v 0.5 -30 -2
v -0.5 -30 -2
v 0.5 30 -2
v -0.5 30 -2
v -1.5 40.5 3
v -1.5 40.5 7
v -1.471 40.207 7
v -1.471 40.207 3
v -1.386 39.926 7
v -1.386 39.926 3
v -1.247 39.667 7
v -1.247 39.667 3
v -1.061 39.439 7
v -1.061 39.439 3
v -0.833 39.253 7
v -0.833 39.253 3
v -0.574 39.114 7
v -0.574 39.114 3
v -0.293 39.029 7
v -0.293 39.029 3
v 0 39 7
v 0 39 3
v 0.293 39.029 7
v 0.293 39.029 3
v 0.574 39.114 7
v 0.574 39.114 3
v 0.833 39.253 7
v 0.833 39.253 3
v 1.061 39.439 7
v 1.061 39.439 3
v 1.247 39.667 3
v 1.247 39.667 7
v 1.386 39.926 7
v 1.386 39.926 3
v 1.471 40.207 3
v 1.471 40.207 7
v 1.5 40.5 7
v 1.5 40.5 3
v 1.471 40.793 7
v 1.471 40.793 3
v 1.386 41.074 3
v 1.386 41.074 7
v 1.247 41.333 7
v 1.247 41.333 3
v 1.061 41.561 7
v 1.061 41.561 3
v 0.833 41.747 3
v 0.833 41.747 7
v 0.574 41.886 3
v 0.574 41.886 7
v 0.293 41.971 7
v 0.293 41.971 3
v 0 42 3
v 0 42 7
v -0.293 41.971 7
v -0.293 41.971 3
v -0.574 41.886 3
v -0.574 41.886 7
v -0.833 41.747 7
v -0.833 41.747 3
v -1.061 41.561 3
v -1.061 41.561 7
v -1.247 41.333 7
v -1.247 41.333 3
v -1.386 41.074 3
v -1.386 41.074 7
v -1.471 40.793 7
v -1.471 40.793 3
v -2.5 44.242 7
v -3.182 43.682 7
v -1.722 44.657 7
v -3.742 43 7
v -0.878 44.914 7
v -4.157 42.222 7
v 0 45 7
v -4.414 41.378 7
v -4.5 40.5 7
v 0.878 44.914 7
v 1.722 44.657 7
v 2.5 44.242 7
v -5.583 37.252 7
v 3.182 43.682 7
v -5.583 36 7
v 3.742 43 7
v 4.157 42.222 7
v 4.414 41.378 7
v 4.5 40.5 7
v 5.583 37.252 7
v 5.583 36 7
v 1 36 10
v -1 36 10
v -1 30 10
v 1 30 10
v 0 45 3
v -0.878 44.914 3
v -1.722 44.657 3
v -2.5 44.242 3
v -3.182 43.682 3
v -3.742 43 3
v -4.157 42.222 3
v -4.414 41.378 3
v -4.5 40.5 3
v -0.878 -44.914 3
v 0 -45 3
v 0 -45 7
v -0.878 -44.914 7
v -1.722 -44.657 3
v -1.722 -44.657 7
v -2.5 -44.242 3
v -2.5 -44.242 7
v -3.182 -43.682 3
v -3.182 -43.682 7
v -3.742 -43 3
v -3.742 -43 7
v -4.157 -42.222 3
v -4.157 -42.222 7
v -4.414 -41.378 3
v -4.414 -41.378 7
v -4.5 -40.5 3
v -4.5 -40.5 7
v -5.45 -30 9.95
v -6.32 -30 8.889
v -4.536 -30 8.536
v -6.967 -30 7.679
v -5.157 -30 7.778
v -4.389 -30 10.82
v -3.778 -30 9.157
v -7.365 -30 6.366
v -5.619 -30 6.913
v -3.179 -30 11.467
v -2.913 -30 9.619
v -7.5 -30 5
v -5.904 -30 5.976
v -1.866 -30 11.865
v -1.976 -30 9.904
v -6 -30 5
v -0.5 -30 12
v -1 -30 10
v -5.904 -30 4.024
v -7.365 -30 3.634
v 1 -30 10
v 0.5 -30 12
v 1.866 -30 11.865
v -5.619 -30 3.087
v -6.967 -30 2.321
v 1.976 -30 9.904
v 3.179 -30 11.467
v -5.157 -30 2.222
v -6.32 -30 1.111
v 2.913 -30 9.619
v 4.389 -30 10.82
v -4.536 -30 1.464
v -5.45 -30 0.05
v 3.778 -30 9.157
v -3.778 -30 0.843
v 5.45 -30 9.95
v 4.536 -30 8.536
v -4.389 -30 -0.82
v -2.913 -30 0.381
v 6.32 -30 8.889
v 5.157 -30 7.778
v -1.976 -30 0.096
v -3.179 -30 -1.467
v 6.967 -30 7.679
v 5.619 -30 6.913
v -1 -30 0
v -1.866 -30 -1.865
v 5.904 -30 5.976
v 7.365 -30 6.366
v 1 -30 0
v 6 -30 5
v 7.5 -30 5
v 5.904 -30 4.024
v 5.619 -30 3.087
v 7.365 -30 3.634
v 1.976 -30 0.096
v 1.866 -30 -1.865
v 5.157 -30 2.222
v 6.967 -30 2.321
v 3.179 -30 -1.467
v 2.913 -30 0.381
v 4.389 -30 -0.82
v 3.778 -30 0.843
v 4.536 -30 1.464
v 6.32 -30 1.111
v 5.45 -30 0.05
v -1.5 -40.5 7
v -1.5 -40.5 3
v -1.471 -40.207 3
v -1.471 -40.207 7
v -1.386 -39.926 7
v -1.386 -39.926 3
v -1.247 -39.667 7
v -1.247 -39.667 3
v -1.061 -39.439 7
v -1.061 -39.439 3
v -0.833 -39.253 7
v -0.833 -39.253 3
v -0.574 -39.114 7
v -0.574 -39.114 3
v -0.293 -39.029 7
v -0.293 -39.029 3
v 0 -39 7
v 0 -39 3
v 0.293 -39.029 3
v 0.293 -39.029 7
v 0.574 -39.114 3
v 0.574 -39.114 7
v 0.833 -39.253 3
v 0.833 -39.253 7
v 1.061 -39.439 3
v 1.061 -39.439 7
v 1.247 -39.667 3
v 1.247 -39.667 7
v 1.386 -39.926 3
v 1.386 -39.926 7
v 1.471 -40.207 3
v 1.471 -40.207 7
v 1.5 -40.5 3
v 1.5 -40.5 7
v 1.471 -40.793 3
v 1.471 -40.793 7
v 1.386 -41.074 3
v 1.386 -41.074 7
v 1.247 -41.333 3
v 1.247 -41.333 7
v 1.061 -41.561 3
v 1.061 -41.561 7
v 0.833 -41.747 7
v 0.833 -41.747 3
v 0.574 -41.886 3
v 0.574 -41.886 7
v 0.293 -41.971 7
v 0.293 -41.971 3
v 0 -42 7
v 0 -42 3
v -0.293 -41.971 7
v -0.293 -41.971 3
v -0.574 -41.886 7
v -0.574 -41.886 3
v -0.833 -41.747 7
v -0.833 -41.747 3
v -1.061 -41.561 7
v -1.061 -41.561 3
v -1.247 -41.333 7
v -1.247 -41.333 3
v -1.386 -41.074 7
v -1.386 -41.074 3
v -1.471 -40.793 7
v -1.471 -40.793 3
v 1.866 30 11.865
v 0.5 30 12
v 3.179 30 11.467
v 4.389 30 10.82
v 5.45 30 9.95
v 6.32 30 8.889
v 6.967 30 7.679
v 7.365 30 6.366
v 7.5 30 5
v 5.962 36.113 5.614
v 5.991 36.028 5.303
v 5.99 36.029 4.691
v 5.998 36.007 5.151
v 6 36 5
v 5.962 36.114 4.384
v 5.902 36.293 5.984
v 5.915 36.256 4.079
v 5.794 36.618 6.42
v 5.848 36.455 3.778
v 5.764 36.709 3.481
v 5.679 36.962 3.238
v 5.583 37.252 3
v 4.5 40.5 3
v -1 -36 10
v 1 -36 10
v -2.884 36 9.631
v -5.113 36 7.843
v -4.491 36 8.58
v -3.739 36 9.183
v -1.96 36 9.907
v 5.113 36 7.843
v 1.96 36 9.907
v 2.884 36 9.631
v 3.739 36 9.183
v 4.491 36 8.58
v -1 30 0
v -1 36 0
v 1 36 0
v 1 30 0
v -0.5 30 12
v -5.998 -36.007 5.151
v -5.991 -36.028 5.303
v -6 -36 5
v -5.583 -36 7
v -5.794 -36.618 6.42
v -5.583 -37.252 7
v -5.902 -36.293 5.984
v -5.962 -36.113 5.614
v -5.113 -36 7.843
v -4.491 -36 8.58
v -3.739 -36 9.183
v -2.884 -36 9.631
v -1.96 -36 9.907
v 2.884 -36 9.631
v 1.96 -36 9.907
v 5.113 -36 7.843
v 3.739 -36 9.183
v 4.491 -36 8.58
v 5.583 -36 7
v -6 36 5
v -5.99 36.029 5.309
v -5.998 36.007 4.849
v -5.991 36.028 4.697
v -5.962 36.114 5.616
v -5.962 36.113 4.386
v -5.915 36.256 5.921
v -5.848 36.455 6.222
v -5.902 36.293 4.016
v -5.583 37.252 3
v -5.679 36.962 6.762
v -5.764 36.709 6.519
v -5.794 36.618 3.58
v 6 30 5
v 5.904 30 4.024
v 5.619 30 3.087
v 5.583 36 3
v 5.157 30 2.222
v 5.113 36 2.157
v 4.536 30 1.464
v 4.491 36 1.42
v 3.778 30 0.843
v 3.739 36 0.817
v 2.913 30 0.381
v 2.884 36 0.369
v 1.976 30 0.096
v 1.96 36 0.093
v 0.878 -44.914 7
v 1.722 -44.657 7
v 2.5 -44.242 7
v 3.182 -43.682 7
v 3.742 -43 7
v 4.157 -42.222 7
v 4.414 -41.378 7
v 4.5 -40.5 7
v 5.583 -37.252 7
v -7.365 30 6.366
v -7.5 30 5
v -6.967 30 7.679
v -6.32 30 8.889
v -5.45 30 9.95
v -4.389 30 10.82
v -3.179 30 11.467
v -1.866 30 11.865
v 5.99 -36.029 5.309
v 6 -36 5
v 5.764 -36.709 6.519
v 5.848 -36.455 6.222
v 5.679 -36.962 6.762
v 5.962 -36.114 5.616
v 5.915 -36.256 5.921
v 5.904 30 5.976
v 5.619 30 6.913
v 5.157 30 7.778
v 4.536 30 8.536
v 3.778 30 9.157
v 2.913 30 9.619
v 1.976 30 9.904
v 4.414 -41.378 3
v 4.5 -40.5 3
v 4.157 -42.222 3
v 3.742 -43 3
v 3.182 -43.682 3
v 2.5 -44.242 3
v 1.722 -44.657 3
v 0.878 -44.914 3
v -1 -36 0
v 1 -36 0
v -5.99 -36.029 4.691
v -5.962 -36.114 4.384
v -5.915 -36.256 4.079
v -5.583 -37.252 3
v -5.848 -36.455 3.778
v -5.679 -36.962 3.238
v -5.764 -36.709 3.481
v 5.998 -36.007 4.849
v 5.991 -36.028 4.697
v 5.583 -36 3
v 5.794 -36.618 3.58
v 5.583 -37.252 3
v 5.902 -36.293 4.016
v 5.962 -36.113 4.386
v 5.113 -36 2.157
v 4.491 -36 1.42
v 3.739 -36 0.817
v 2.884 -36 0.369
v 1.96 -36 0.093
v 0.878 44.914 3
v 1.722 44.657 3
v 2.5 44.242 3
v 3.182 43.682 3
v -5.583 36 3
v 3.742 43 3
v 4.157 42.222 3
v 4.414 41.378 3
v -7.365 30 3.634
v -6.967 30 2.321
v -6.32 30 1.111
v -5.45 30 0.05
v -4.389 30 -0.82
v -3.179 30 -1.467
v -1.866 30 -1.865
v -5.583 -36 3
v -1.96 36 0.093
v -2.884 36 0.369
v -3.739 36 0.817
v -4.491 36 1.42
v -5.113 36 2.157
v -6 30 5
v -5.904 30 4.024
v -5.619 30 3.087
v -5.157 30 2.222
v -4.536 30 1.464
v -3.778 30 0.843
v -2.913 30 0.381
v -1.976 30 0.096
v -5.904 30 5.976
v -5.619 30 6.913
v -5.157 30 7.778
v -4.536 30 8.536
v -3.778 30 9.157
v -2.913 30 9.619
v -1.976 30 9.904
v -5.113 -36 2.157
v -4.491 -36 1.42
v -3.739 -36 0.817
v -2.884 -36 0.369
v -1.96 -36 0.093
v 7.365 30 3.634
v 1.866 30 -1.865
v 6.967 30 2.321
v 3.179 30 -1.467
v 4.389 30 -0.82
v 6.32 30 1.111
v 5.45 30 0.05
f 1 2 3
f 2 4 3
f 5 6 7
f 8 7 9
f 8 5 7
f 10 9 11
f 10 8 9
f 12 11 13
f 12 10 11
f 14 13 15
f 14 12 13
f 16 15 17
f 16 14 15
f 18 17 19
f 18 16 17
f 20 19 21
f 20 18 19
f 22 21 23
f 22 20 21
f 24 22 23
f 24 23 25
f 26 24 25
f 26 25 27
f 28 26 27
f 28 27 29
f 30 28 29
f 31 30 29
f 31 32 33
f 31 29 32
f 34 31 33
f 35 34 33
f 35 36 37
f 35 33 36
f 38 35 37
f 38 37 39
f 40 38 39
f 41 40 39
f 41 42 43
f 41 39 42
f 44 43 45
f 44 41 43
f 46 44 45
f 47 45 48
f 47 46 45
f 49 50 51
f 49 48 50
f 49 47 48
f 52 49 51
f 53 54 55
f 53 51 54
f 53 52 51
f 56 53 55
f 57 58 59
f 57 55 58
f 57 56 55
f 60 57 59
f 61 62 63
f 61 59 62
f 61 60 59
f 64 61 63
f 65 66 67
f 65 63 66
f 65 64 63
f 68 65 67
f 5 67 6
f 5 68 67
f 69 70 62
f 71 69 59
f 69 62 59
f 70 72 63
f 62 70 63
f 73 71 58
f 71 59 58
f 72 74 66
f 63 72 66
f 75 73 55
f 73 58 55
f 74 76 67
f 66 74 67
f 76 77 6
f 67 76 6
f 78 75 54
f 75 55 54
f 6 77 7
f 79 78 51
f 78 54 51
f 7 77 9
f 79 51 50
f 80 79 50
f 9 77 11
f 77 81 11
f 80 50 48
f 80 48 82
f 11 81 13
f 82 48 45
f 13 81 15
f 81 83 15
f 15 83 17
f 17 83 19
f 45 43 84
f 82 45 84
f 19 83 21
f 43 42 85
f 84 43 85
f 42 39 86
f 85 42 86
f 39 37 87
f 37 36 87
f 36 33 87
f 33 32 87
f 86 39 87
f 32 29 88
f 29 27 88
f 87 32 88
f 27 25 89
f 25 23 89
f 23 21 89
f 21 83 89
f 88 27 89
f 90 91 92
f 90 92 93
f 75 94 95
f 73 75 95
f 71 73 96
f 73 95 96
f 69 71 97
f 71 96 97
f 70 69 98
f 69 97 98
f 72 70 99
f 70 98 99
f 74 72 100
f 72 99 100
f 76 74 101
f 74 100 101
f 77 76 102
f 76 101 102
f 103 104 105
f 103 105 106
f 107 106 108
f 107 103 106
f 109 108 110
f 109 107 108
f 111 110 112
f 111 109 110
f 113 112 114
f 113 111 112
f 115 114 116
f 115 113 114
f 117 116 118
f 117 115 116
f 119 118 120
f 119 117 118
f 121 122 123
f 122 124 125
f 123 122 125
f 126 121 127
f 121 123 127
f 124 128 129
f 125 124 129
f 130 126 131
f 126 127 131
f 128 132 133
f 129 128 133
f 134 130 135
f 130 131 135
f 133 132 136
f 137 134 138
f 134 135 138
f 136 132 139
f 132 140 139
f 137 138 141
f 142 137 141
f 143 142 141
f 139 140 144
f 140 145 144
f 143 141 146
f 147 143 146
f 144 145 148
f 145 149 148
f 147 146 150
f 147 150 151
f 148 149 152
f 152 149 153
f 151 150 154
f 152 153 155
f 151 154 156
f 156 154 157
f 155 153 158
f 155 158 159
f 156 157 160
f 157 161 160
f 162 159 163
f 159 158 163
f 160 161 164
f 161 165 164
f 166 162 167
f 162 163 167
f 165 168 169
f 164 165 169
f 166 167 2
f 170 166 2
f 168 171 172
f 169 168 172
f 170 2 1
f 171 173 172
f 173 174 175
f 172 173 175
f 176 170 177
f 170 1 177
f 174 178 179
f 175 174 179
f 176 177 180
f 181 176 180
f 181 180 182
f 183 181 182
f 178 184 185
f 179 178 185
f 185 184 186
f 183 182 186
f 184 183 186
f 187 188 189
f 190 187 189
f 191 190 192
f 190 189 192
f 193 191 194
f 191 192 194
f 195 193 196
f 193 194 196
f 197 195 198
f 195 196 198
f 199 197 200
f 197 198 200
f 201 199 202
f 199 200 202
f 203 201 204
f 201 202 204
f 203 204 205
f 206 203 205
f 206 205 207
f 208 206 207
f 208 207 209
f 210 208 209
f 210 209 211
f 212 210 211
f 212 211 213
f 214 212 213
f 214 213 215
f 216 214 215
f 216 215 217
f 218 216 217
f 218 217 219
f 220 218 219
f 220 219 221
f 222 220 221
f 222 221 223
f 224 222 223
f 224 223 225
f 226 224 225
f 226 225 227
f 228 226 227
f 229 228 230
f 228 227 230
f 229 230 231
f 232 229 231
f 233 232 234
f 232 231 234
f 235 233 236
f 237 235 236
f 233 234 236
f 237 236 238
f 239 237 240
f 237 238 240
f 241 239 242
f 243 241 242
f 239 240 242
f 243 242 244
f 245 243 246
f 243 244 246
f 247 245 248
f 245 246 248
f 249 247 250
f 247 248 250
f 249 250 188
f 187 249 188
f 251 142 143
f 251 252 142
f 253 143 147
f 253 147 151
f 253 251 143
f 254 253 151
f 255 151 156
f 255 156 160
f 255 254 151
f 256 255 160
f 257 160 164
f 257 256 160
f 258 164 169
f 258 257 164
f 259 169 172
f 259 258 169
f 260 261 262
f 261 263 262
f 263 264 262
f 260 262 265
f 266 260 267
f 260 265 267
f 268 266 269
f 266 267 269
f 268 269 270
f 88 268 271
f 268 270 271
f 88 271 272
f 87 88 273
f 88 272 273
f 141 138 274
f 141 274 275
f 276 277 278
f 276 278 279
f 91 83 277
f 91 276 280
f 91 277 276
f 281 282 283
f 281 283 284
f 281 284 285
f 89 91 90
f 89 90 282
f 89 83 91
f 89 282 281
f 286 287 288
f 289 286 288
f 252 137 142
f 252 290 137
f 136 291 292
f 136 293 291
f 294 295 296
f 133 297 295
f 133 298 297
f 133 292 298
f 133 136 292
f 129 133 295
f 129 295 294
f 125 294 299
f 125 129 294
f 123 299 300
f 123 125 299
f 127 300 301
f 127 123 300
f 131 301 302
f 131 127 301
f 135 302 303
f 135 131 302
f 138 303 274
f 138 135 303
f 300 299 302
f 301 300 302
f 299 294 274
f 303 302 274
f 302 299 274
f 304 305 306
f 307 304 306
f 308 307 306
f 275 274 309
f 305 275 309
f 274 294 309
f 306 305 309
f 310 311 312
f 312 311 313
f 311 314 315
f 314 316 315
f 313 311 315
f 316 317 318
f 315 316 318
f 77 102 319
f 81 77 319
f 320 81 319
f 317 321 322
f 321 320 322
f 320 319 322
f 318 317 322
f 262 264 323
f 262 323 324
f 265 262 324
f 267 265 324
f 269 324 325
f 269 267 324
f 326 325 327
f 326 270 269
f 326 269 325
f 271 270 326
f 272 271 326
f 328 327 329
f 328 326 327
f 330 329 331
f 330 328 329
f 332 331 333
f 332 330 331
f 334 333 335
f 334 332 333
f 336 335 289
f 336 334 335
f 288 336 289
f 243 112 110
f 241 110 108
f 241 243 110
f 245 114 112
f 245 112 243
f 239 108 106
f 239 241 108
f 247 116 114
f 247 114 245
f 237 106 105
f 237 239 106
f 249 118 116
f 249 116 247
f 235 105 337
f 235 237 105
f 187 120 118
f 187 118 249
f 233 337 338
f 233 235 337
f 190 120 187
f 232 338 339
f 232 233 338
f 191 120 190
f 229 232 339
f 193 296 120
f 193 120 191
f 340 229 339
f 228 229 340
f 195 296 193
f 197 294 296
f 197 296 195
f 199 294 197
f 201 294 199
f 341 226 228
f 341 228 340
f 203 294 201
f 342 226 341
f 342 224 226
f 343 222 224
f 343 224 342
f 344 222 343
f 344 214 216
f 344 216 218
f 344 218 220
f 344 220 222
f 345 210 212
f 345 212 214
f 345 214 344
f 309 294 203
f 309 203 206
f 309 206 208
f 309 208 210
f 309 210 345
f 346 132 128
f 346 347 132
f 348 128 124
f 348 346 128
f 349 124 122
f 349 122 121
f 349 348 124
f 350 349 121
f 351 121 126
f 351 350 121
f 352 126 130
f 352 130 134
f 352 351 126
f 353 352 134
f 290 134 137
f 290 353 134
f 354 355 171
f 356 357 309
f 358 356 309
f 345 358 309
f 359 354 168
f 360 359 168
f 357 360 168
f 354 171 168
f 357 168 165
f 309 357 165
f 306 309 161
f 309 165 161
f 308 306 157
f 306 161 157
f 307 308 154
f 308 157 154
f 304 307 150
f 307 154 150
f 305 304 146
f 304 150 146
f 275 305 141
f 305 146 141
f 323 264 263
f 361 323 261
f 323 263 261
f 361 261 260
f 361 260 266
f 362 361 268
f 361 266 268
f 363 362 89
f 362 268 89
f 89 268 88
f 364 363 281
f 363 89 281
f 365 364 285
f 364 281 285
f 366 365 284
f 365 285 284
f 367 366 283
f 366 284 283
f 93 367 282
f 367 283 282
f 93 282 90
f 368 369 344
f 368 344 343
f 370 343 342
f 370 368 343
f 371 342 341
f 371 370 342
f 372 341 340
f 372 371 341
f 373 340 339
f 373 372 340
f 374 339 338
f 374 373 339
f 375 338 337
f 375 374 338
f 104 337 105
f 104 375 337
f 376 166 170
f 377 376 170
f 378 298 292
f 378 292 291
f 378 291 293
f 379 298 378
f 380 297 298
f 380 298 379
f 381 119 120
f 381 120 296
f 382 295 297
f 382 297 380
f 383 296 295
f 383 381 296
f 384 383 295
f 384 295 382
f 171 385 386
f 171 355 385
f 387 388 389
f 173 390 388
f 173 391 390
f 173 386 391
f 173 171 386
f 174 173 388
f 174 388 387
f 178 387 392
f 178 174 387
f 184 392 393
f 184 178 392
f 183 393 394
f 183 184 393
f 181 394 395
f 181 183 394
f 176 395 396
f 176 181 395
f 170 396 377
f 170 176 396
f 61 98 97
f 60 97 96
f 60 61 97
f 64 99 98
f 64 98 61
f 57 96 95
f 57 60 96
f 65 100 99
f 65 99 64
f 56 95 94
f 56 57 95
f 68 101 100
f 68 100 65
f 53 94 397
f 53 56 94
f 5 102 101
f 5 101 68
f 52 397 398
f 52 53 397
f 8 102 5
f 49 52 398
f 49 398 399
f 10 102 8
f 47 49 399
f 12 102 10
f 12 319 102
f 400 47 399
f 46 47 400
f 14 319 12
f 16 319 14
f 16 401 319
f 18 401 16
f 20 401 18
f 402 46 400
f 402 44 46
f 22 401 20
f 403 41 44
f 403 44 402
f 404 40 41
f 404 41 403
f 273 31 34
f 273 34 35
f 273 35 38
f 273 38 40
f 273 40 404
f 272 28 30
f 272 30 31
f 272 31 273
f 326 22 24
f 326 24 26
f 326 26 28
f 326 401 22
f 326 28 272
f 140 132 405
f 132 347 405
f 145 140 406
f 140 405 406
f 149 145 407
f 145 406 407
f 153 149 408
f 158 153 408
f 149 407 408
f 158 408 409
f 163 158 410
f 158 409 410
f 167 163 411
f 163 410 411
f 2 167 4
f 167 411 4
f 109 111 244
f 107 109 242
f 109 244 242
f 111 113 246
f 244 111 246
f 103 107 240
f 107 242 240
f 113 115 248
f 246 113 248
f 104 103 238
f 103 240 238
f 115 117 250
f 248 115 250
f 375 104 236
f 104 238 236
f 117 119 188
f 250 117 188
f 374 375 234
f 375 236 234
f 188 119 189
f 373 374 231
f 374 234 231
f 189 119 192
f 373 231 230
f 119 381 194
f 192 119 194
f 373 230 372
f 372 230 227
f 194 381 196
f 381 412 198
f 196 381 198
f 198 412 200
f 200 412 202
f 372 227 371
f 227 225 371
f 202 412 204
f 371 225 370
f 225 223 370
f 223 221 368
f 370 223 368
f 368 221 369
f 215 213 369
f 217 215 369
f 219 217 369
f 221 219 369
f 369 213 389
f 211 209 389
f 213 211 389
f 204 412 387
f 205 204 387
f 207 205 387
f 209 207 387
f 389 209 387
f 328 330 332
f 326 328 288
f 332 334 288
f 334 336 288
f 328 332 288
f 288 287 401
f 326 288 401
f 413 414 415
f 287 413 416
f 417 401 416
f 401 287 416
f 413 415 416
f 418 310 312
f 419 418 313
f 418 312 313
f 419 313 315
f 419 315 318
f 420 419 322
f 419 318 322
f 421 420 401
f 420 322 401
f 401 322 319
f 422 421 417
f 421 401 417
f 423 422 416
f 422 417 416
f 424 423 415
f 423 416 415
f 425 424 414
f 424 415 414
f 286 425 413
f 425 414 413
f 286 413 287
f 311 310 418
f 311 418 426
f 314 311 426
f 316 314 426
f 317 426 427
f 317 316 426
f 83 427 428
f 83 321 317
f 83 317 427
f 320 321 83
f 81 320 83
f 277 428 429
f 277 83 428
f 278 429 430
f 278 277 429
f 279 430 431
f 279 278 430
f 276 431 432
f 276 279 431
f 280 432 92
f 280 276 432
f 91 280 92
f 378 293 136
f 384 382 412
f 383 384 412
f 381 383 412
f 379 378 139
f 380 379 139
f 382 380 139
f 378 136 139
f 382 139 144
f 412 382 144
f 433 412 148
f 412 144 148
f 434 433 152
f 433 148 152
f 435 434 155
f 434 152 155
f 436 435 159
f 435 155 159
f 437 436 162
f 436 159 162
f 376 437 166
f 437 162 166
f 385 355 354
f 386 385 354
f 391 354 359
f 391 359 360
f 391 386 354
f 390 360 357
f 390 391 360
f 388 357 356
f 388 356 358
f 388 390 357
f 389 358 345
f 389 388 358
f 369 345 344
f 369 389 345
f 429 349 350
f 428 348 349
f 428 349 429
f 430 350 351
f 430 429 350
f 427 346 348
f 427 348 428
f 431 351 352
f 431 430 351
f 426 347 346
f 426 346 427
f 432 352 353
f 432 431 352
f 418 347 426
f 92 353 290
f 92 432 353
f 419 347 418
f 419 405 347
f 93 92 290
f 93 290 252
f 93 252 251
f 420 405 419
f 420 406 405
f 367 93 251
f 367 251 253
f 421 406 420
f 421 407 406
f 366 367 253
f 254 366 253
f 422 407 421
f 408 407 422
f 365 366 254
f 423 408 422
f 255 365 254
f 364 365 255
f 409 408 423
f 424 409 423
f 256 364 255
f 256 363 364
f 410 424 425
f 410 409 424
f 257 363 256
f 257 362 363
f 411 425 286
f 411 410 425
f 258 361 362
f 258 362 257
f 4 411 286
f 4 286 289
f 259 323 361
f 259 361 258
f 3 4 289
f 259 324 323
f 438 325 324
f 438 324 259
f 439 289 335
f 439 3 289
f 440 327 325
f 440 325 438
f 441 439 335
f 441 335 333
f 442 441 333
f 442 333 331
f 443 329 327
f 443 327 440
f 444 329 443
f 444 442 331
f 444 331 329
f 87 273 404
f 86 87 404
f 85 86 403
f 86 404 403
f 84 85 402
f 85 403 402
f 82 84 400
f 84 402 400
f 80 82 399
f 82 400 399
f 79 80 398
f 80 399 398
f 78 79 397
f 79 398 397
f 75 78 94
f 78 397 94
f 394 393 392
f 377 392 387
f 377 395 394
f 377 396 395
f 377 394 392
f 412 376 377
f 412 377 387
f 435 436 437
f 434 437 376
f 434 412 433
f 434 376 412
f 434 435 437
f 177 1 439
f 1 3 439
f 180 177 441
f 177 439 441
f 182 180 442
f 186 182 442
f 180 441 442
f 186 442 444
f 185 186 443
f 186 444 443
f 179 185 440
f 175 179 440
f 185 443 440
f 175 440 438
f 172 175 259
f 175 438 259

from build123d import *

# Parameters (mm, degrees)
SKETCH2_W                = 12
SKETCH2_H                = 90
BOSS_EXTRUDE1_DEPTH      = 10
FILLET1_R                = 5
CUT_EXTRUDE1_DEPTH       = 3
CUT_EXTRUDE2_START       = 7
SKETCH3_2_W              = 12
SKETCH3_2_H              = 9
CUT_EXTRUDE2_DEPTH       = 3
CUT_EXTRUDE4_START       = -4
CUT_EXTRUDE4_DEPTH       = 51.486557197
SKETCH7_R                = 1.5
CUT_EXTRUDE5_DEPTH       = 46.934736311
BOSS_EXTRUDE2_DEPTH      = 7
BOSS_EXTRUDE2_DEPTH_BACK = 7
SKETCH9_W                = 15
SKETCH9_H                = 60
FILLET3_R                = 7


with BuildPart() as part:
    # Sketch2 → Boss-Extrude1 (new body)
    with BuildSketch(Plane.XY):
        Rectangle(SKETCH2_W, SKETCH2_H)
    extrude(amount=BOSS_EXTRUDE1_DEPTH)

    # Fillet1
    fillet1_edges = [part.edges().sort_by_distance(p)[0] for p in [
        (-6, 0, 0),
        (6, 0, 0),
        (6, 0, 10),
        (-6, 0, 10),
    ]]
    fillet(fillet1_edges, radius=FILLET1_R - 0.0001)  # a hair under: the kernel refuses the full size

    # Sketch3 → Cut-Extrude1 (cut)
    with BuildSketch(Plane.XY):
        with BuildLine():
            Line((-6, -36), (-4.5, -40.5))
            ThreePointArc((-4.5, -40.5), (0, -45), (4.5, -40.5))
            Line((4.5, -40.5), (6, -36))
            Line((6, -36), (-6, -36))
        make_face()
        with BuildLine():
            Line((-3.9e-08, -45), (6, -45))
            Line((6, -45), (6, -36))
            Line((6, -36), (4.5, -40.5))
            ThreePointArc((4.5, -40.5), (3.181980501, -43.681980529), (-3.9e-08, -45))
        make_face()
        with BuildLine():
            Line((-6, -45), (-3.9e-08, -45))
            ThreePointArc((-3.9e-08, -45), (-3.181980529, -43.681980501), (-4.5, -40.5))
            Line((-4.5, -40.5), (-6, -36))
            Line((-6, -36), (-6, -45))
        make_face()
    cut_extrude1 = extrude(amount=CUT_EXTRUDE1_DEPTH, mode=Mode.SUBTRACT)

    # Sketch3<2> → Cut-Extrude2 (cut)
    with BuildSketch(Plane.XY.offset(CUT_EXTRUDE2_START)):
        with Locations((0, -40.5)):
            Rectangle(SKETCH3_2_W, SKETCH3_2_H)
    cut_extrude2 = extrude(amount=CUT_EXTRUDE2_DEPTH, mode=Mode.SUBTRACT)

    # Mirror1: Cut-Extrude1, Cut-Extrude2 across plane
    add(cut_extrude1.mirror(Plane.ZX), mode=Mode.SUBTRACT)
    add(cut_extrude2.mirror(Plane.ZX), mode=Mode.SUBTRACT)

    # Sketch3<4> → Cut-Extrude4 (cut)
    with BuildSketch(Plane.XY.offset(CUT_EXTRUDE4_START)):
        with BuildLine():
            Line((-3.9e-08, -45), (6, -45))
            Line((6, -45), (6, -36))
            Line((6, -36), (4.5, -40.5))
            ThreePointArc((4.5, -40.5), (3.181980501, -43.681980529), (-3.9e-08, -45))
        make_face()
        with BuildLine():
            Line((-6, -45), (-3.9e-08, -45))
            ThreePointArc((-3.9e-08, -45), (-3.181980529, -43.681980501), (-4.5, -40.5))
            Line((-4.5, -40.5), (-6, -36))
            Line((-6, -36), (-6, -45))
        make_face()
    cut_extrude4 = extrude(amount=CUT_EXTRUDE4_DEPTH, mode=Mode.SUBTRACT)

    # Sketch7 → Cut-Extrude5 (cut, through all)
    with BuildSketch(Plane(origin=(0, 0, 3), x_dir=(-1, 0, 0), z_dir=(0, 0, -1))):
        with Locations((0, -40.5)):
            Circle(SKETCH7_R)
    cut_extrude5 = extrude(amount=-CUT_EXTRUDE5_DEPTH, mode=Mode.SUBTRACT)

    # Mirror3: Cut-Extrude5 across plane
    add(cut_extrude5.mirror(Plane.ZX), mode=Mode.SUBTRACT)

    # Mirror4: Cut-Extrude4 across plane
    add(cut_extrude4.mirror(Plane.ZX), mode=Mode.SUBTRACT)

    # Sketch9 → Boss-Extrude2 (add, two sides: drawn at the far end of the back side and taken through both)
    with BuildSketch(Plane.XY.offset(5).offset(-BOSS_EXTRUDE2_DEPTH_BACK)):
        Rectangle(SKETCH9_W, SKETCH9_H)
    extrude(amount=BOSS_EXTRUDE2_DEPTH + BOSS_EXTRUDE2_DEPTH_BACK)

    # Fillet3
    fillet3_edges = [part.edges().sort_by_distance(p)[0] for p in [
        (-7.5, 0, 12),
        (7.5, 0, 12),
        (7.5, 0, -2),
        (-7.5, 0, -2),
    ]]
    fillet(fillet3_edges, radius=FILLET3_R - 0.0001)  # a hair under: the kernel refuses the full size


solid = part.part
